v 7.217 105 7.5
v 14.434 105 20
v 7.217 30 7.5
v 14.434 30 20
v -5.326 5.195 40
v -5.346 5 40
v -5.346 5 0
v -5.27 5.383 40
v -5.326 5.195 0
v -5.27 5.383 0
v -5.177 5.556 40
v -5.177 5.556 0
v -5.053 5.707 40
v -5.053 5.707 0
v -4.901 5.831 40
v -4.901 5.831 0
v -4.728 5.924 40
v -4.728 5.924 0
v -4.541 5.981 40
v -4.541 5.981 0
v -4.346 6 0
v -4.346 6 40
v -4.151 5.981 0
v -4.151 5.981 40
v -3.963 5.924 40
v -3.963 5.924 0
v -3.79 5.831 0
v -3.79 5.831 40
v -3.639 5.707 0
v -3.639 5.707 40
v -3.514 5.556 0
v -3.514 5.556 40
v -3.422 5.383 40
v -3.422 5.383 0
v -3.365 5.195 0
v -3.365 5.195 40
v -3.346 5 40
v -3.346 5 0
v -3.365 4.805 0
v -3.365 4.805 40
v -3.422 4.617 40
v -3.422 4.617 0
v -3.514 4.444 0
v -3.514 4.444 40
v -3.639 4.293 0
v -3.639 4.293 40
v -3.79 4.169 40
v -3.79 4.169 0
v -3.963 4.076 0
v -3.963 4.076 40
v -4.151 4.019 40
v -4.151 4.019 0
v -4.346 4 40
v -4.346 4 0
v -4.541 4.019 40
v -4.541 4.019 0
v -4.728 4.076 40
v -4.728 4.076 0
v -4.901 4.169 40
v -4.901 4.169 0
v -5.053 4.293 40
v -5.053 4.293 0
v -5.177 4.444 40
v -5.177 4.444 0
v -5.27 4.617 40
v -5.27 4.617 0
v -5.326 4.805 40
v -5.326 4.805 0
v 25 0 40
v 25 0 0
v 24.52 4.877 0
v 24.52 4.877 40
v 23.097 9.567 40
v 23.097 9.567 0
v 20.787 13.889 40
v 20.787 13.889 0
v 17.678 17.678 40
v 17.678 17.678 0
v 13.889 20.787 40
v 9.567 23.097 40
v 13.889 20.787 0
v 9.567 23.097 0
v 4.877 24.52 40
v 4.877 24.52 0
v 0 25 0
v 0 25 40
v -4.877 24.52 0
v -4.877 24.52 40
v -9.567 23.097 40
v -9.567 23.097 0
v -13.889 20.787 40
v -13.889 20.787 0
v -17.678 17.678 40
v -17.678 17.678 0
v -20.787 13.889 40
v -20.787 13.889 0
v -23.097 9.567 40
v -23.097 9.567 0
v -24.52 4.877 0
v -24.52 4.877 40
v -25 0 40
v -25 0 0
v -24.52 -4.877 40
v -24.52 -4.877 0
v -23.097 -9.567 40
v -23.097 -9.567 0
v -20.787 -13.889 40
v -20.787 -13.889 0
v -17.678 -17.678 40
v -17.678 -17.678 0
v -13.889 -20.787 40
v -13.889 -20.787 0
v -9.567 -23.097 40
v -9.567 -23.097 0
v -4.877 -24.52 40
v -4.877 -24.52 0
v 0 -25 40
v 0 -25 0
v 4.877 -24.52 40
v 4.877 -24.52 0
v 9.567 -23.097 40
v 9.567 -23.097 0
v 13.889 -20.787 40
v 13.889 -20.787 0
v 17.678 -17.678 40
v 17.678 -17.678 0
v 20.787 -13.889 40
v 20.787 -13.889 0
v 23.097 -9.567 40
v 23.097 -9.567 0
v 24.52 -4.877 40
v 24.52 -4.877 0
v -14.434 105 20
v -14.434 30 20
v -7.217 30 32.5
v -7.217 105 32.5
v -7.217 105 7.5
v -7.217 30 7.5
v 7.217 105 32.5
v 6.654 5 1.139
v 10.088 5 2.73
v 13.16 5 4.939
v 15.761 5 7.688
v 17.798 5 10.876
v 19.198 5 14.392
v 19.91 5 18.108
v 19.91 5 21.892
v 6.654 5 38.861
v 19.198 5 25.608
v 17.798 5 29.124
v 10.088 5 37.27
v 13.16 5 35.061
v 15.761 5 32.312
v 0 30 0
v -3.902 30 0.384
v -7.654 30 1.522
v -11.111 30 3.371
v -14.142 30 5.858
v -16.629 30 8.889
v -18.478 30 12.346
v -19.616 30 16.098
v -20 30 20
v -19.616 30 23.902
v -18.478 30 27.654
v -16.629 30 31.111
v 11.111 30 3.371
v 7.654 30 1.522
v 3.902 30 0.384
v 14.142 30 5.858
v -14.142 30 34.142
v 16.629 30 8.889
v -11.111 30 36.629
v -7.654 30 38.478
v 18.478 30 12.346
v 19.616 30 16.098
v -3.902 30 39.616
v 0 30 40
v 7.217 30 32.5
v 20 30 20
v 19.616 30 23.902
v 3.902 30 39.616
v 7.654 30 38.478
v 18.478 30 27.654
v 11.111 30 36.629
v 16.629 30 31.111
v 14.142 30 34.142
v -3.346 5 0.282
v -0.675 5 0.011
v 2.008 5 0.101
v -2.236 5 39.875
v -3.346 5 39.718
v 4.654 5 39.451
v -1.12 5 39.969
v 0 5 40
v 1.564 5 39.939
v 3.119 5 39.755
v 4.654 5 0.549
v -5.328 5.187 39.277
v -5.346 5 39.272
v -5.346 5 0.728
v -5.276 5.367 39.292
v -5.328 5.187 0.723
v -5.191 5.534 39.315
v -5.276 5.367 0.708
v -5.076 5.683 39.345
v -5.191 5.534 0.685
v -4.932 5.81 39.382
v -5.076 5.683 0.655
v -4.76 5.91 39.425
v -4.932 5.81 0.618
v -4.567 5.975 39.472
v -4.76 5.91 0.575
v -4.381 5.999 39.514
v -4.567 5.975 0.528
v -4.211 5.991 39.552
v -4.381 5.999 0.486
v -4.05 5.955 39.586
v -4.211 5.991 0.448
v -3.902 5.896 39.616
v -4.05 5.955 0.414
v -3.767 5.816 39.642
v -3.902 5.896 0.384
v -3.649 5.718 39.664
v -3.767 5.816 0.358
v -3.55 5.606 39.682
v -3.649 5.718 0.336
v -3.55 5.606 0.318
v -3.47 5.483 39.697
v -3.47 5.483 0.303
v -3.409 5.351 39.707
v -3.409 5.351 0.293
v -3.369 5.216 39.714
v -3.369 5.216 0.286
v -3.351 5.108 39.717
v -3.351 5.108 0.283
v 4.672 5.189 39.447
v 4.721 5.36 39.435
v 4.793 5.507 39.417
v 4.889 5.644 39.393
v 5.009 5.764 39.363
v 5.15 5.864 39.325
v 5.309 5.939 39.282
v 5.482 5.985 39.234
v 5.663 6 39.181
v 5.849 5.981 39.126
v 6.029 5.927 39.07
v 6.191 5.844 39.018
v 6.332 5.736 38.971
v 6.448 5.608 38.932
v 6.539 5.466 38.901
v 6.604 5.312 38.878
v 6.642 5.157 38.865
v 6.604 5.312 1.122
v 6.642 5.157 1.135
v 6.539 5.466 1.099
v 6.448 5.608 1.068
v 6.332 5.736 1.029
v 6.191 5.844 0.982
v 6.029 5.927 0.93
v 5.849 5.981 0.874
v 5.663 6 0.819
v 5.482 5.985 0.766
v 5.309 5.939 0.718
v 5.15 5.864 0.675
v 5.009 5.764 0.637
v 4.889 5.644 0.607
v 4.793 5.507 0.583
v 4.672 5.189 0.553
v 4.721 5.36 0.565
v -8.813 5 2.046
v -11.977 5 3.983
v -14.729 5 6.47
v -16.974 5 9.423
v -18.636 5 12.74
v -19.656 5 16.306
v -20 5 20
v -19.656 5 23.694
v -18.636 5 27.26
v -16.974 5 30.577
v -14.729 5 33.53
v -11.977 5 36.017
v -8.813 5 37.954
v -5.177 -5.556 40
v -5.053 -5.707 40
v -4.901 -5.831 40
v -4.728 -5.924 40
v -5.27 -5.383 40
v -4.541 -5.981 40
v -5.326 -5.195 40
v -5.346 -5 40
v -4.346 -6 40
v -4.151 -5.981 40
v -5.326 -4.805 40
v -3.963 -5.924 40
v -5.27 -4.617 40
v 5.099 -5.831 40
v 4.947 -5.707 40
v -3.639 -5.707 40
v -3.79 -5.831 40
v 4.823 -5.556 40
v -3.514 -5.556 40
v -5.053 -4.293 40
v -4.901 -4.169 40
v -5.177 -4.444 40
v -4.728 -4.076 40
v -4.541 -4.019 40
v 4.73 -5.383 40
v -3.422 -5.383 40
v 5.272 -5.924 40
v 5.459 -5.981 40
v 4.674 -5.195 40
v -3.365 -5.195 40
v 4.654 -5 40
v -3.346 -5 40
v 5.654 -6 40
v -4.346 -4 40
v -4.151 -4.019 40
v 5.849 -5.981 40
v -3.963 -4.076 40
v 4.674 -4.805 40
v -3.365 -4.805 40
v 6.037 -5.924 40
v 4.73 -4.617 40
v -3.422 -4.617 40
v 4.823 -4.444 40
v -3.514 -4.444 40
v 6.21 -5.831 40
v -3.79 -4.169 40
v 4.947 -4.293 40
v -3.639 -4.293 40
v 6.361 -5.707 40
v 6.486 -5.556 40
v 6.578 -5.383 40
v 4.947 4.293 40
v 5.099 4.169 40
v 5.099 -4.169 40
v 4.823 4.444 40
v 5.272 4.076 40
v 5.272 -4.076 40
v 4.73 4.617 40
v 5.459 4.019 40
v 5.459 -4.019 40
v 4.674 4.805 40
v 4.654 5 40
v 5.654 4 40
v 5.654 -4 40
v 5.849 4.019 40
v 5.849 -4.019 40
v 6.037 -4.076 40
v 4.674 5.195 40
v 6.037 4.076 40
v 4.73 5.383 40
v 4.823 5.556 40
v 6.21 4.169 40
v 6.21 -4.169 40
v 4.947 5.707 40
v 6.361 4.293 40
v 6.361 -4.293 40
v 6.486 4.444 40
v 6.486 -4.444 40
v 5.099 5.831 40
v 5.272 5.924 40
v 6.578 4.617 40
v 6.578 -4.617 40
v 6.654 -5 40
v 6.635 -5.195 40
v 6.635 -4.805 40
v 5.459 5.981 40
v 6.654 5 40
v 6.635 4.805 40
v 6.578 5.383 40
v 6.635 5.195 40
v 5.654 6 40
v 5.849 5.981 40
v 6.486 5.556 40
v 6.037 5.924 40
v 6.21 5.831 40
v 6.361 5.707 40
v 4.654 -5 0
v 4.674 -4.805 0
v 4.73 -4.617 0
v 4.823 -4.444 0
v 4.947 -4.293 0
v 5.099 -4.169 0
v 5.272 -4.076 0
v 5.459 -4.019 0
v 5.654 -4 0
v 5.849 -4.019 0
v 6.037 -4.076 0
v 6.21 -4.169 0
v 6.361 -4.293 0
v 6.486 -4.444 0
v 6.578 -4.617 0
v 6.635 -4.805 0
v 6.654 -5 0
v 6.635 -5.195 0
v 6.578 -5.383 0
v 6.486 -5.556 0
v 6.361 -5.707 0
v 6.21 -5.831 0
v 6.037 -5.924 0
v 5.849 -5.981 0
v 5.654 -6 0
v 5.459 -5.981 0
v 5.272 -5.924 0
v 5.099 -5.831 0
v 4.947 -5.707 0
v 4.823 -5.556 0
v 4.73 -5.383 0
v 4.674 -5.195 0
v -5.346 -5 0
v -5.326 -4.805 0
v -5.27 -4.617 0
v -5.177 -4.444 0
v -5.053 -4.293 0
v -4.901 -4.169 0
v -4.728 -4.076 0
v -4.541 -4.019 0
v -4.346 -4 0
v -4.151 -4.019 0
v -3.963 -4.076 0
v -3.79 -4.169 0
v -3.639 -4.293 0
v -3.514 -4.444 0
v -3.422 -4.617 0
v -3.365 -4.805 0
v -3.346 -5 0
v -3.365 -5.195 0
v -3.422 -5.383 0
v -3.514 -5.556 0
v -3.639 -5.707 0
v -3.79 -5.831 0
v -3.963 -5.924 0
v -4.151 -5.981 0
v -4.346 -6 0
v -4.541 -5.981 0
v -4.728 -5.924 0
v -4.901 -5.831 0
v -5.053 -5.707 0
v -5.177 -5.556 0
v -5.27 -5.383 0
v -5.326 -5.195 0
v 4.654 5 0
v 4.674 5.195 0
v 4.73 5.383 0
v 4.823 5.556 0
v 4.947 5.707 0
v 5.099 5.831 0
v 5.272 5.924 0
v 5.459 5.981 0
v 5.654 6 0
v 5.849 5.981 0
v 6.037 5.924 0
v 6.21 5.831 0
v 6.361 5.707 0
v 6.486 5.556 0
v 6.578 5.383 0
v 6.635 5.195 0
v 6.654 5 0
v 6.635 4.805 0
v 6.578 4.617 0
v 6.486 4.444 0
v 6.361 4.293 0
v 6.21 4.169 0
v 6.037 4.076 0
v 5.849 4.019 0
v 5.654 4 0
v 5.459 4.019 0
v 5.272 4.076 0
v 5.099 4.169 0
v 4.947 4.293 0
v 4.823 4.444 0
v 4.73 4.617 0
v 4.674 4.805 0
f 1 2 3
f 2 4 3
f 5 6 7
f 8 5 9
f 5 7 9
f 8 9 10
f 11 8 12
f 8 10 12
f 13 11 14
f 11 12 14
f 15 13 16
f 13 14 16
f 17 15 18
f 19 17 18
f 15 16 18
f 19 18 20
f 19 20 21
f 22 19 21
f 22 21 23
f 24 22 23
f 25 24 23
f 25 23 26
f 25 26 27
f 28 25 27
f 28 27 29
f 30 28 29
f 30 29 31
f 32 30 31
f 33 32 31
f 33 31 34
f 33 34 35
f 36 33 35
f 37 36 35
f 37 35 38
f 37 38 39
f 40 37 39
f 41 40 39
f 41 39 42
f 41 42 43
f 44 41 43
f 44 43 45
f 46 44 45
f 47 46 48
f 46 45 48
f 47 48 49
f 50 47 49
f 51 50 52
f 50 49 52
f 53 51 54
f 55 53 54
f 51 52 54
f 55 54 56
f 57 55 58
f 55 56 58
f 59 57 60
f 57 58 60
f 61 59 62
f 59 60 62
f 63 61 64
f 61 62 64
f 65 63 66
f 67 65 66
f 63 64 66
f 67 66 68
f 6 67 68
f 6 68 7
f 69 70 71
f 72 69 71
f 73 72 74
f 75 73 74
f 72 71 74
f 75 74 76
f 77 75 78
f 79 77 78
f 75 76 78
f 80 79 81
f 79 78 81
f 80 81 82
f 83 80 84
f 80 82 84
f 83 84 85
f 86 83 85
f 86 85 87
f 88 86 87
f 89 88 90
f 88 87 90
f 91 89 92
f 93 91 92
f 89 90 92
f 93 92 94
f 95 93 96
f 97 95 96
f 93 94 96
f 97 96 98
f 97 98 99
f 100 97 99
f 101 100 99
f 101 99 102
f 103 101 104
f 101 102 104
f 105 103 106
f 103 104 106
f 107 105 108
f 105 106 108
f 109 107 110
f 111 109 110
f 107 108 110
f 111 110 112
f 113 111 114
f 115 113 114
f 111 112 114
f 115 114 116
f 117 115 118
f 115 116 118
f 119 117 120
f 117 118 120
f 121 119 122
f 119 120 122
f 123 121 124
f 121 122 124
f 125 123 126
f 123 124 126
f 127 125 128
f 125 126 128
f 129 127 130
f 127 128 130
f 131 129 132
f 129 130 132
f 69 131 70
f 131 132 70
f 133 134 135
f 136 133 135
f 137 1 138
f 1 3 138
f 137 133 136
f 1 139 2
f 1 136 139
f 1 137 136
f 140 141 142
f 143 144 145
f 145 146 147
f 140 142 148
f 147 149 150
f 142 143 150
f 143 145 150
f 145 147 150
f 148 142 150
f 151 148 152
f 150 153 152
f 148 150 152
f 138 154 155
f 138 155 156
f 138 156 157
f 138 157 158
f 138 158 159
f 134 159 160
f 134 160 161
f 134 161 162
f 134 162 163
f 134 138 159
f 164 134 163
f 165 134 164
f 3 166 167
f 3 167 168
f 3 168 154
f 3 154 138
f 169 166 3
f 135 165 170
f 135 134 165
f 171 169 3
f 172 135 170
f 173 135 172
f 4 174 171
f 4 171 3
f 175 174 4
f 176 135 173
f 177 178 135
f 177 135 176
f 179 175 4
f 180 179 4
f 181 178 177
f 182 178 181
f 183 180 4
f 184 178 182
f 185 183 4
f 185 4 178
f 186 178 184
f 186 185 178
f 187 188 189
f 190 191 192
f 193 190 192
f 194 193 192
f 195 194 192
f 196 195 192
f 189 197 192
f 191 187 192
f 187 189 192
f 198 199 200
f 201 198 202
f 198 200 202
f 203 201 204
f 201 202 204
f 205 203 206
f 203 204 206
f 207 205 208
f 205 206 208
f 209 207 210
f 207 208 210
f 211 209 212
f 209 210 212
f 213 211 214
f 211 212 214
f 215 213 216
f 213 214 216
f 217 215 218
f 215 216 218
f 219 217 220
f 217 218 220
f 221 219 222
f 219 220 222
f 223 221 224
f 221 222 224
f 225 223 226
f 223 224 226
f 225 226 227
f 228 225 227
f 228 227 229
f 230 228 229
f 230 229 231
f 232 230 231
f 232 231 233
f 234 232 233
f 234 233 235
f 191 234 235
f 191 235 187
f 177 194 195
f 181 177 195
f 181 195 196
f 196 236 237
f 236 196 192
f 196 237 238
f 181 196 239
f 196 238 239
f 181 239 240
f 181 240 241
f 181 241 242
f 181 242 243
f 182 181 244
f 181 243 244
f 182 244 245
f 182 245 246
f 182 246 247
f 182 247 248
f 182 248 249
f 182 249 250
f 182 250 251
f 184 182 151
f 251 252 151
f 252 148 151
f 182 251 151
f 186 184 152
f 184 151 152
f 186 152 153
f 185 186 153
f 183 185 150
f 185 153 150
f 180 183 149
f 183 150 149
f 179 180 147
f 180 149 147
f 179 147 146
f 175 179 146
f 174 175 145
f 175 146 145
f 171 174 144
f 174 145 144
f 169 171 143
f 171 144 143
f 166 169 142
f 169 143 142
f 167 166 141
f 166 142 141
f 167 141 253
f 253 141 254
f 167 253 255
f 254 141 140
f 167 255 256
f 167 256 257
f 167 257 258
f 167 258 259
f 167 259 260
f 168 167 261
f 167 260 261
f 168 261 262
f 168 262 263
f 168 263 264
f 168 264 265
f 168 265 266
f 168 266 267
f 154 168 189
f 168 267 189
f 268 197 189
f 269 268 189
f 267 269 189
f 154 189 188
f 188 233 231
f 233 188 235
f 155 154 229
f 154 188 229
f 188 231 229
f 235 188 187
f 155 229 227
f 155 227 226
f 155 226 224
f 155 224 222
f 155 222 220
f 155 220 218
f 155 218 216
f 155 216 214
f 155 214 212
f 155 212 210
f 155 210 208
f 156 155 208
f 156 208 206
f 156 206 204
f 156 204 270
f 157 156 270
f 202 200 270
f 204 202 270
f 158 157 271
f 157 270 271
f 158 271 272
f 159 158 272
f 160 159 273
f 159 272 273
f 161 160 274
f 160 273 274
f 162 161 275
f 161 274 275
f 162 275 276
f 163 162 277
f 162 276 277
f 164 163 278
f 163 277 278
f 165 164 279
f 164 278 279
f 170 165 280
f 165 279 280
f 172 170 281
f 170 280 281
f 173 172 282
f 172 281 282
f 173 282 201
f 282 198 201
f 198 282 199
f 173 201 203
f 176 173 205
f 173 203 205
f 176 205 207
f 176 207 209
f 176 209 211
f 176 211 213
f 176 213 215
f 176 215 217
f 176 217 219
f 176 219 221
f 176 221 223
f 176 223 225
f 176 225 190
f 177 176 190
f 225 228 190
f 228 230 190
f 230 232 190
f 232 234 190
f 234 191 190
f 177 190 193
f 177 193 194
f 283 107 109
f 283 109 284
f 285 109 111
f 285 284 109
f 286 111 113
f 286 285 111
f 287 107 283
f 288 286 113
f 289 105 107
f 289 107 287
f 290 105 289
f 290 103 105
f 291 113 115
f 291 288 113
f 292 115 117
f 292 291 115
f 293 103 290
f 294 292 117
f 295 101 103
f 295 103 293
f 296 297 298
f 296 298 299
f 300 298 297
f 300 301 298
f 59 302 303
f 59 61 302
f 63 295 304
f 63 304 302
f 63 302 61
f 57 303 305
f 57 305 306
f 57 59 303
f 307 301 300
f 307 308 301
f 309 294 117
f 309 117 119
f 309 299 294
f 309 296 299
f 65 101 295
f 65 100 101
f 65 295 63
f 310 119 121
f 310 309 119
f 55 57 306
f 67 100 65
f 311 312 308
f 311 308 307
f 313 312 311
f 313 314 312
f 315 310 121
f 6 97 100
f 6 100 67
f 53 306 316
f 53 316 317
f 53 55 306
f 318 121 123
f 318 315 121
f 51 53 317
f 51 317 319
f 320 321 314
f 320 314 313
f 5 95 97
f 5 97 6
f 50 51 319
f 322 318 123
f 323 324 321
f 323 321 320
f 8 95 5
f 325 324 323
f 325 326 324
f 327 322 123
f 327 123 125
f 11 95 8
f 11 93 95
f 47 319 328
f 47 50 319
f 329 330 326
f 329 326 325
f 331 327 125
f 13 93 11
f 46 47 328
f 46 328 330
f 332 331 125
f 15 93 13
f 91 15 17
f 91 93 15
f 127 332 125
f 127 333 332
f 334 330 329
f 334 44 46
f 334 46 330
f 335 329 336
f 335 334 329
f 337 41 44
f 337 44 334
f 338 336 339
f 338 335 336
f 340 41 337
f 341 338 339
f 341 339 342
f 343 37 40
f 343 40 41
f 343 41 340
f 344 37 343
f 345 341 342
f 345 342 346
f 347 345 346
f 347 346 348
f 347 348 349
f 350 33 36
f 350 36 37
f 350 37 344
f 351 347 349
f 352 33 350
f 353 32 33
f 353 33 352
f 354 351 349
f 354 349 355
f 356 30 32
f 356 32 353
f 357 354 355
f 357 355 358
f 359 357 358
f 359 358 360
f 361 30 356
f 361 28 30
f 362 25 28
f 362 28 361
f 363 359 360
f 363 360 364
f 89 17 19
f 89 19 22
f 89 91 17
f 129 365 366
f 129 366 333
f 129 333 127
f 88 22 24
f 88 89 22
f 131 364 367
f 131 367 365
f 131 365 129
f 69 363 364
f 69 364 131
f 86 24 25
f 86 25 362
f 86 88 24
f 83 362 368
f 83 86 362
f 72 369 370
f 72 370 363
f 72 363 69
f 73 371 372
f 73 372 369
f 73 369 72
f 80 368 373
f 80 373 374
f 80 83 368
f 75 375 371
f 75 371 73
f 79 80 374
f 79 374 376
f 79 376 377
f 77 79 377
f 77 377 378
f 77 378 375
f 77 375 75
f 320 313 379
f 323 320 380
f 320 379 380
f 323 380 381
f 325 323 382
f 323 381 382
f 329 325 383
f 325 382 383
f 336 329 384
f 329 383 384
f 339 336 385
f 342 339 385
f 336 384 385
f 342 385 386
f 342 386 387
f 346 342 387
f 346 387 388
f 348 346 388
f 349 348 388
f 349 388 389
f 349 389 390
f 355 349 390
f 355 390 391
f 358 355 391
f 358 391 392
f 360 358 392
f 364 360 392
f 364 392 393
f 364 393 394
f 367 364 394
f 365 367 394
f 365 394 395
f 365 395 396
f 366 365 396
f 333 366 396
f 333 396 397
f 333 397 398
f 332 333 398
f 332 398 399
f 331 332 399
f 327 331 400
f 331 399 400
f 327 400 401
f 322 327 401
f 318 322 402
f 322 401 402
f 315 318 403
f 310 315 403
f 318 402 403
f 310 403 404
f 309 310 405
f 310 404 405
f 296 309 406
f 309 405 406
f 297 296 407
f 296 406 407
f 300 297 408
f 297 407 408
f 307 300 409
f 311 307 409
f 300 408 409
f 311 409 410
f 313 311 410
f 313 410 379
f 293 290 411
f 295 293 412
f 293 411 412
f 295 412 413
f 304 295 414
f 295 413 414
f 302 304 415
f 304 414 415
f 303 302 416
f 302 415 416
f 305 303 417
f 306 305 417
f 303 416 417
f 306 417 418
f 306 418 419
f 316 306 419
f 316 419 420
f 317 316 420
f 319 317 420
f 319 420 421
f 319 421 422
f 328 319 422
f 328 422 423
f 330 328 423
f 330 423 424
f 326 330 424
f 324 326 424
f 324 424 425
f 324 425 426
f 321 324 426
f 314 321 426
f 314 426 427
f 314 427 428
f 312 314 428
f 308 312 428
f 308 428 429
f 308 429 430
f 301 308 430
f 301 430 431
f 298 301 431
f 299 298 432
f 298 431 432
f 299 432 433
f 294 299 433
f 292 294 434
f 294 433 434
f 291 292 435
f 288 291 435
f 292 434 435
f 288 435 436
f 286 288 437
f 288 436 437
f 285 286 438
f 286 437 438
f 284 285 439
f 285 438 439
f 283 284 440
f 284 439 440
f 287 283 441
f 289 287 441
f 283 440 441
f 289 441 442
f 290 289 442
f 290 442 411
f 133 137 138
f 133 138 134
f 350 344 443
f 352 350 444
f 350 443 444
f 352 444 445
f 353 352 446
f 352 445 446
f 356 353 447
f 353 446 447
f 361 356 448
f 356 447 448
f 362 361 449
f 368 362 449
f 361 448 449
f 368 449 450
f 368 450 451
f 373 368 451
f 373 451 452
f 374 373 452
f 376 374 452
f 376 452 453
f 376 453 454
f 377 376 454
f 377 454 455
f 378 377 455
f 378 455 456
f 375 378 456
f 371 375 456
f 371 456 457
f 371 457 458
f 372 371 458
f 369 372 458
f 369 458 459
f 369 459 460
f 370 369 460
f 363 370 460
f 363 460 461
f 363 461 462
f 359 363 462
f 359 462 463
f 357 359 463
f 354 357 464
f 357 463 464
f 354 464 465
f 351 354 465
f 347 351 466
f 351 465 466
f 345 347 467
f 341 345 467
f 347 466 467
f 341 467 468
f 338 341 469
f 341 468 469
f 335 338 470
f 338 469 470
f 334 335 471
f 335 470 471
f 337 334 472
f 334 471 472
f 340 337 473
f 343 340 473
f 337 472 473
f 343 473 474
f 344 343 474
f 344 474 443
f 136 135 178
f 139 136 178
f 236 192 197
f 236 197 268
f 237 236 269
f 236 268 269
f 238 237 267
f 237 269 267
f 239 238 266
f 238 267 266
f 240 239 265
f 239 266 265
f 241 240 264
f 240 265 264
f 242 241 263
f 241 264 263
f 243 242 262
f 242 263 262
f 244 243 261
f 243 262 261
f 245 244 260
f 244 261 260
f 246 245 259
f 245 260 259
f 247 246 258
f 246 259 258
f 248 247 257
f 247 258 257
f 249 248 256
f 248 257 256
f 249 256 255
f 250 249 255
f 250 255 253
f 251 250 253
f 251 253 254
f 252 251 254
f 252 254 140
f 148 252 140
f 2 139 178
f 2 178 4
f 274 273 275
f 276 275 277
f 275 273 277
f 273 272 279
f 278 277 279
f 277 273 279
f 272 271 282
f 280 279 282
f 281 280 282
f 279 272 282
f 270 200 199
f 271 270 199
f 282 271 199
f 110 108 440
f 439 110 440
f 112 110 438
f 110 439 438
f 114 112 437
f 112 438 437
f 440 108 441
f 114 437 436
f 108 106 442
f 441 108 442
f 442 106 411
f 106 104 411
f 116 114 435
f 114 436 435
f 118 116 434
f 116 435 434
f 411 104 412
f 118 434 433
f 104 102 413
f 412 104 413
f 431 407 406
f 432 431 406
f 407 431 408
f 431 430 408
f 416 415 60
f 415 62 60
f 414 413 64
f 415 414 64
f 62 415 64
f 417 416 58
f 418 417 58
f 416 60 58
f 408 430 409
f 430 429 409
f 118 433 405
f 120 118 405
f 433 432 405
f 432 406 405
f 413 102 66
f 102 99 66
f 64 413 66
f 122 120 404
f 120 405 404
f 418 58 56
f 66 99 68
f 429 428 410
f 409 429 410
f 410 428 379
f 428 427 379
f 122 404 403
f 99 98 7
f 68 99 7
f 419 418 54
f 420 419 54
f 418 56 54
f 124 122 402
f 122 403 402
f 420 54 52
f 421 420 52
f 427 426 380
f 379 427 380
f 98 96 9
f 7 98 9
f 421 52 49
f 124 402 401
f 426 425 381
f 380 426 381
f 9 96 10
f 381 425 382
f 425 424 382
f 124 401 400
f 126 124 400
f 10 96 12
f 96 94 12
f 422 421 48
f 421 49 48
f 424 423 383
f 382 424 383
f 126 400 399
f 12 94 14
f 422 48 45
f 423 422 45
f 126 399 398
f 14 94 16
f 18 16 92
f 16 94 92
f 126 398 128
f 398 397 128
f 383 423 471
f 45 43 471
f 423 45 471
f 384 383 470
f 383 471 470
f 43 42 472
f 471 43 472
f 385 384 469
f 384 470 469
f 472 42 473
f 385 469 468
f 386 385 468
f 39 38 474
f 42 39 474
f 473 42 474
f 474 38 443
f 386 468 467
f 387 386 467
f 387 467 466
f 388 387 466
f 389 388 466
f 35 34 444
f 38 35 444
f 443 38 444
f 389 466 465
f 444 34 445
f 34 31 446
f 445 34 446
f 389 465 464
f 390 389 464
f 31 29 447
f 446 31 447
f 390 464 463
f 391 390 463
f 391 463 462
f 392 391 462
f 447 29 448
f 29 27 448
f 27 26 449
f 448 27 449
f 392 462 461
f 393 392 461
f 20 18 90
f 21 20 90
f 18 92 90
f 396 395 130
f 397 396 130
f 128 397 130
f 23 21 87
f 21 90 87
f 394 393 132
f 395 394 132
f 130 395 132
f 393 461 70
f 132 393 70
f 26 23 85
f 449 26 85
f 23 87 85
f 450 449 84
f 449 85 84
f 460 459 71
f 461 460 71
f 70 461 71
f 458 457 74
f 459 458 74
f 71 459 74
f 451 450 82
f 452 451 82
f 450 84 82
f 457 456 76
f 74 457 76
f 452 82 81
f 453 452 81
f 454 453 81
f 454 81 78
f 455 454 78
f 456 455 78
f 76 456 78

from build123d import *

# Parameters (mm, degrees)
SKETCH1_R           = 25
BOSS_EXTRUDE1_DEPTH = 40
SKETCH2_R           = 20
BOSS_EXTRUDE2_DEPTH = 25
BOSS_EXTRUDE3_DEPTH = 25
BOSS_EXTRUDE4_DEPTH = 50
SKETCH5_R           = 1
CUT_EXTRUDE1_DEPTH  = 50


with BuildPart() as part:
    # Sketch1 → Boss-Extrude1 (new body)
    with BuildSketch(Plane.XY):
        Circle(SKETCH1_R)
    extrude(amount=BOSS_EXTRUDE1_DEPTH)


with BuildPart() as body_2:
    # Sketch2 → Boss-Extrude2 (new body)
    with BuildSketch(Plane(origin=(0, 5, 0), x_dir=(1, 0, 0), z_dir=(0, 1, 0))):
        with Locations(Location((0, -20, 0), (0, 0, 270))):
            Circle(SKETCH2_R)
    extrude(amount=BOSS_EXTRUDE2_DEPTH)

    # Sketch3 → Boss-Extrude3 (add)
    with BuildSketch(Plane(origin=(0, 30, 0), x_dir=(1, 0, 0), z_dir=(0, 1, 0))):
        Polygon((0, -20), (0, -7.5), (-7.216878365, -7.5), (-14.43375673, -20), (-7.216878365, -32.5), (7.216878365, -32.5), (14.43375673, -20), align=None)
        Polygon((7.216878365, -7.5), (0, -7.5), (0, -20), (14.43375673, -20), align=None)
    extrude(amount=BOSS_EXTRUDE3_DEPTH)

    # Sketch4 → Boss-Extrude4 (add)
    with BuildSketch(Plane(origin=(0, 55, 0), x_dir=(1, 0, 0), z_dir=(0, 1, 0))):
        Polygon((7.216878365, -32.5), (14.43375673, -20), (7.216878365, -7.5), (-7.216878365, -7.5), (-14.43375673, -20), (-7.216878365, -32.5), align=None)
    extrude(amount=BOSS_EXTRUDE4_DEPTH)


with BuildPart() as cut_extrude1_tool:
    # Sketch5 → Cut-Extrude1 (new body)
    with BuildSketch(Plane(origin=(0, 0, 0), x_dir=(-1, 0, 0), z_dir=(0, 0, -1))):
        with Locations((-5.654377193, 5)):
            Circle(SKETCH5_R)
        with Locations((4.345622807, 5)):
            Circle(SKETCH5_R)
        with Locations((4.345622807, -5)):
            Circle(SKETCH5_R)
        with Locations((-5.654377193, -5)):
            Circle(SKETCH5_R)
    extrude(amount=-CUT_EXTRUDE1_DEPTH)


with BuildPart() as part_1:
    add(part.part)

    # Cut-Extrude1: cut by cut_extrude1_tool
    add(cut_extrude1_tool.part, mode=Mode.SUBTRACT)


with BuildPart() as body_2_1:
    add(body_2.part)

    # Cut-Extrude1: cut by cut_extrude1_tool
    add(cut_extrude1_tool.part, mode=Mode.SUBTRACT)


solid = Compound([part_1.part, body_2_1.part])
